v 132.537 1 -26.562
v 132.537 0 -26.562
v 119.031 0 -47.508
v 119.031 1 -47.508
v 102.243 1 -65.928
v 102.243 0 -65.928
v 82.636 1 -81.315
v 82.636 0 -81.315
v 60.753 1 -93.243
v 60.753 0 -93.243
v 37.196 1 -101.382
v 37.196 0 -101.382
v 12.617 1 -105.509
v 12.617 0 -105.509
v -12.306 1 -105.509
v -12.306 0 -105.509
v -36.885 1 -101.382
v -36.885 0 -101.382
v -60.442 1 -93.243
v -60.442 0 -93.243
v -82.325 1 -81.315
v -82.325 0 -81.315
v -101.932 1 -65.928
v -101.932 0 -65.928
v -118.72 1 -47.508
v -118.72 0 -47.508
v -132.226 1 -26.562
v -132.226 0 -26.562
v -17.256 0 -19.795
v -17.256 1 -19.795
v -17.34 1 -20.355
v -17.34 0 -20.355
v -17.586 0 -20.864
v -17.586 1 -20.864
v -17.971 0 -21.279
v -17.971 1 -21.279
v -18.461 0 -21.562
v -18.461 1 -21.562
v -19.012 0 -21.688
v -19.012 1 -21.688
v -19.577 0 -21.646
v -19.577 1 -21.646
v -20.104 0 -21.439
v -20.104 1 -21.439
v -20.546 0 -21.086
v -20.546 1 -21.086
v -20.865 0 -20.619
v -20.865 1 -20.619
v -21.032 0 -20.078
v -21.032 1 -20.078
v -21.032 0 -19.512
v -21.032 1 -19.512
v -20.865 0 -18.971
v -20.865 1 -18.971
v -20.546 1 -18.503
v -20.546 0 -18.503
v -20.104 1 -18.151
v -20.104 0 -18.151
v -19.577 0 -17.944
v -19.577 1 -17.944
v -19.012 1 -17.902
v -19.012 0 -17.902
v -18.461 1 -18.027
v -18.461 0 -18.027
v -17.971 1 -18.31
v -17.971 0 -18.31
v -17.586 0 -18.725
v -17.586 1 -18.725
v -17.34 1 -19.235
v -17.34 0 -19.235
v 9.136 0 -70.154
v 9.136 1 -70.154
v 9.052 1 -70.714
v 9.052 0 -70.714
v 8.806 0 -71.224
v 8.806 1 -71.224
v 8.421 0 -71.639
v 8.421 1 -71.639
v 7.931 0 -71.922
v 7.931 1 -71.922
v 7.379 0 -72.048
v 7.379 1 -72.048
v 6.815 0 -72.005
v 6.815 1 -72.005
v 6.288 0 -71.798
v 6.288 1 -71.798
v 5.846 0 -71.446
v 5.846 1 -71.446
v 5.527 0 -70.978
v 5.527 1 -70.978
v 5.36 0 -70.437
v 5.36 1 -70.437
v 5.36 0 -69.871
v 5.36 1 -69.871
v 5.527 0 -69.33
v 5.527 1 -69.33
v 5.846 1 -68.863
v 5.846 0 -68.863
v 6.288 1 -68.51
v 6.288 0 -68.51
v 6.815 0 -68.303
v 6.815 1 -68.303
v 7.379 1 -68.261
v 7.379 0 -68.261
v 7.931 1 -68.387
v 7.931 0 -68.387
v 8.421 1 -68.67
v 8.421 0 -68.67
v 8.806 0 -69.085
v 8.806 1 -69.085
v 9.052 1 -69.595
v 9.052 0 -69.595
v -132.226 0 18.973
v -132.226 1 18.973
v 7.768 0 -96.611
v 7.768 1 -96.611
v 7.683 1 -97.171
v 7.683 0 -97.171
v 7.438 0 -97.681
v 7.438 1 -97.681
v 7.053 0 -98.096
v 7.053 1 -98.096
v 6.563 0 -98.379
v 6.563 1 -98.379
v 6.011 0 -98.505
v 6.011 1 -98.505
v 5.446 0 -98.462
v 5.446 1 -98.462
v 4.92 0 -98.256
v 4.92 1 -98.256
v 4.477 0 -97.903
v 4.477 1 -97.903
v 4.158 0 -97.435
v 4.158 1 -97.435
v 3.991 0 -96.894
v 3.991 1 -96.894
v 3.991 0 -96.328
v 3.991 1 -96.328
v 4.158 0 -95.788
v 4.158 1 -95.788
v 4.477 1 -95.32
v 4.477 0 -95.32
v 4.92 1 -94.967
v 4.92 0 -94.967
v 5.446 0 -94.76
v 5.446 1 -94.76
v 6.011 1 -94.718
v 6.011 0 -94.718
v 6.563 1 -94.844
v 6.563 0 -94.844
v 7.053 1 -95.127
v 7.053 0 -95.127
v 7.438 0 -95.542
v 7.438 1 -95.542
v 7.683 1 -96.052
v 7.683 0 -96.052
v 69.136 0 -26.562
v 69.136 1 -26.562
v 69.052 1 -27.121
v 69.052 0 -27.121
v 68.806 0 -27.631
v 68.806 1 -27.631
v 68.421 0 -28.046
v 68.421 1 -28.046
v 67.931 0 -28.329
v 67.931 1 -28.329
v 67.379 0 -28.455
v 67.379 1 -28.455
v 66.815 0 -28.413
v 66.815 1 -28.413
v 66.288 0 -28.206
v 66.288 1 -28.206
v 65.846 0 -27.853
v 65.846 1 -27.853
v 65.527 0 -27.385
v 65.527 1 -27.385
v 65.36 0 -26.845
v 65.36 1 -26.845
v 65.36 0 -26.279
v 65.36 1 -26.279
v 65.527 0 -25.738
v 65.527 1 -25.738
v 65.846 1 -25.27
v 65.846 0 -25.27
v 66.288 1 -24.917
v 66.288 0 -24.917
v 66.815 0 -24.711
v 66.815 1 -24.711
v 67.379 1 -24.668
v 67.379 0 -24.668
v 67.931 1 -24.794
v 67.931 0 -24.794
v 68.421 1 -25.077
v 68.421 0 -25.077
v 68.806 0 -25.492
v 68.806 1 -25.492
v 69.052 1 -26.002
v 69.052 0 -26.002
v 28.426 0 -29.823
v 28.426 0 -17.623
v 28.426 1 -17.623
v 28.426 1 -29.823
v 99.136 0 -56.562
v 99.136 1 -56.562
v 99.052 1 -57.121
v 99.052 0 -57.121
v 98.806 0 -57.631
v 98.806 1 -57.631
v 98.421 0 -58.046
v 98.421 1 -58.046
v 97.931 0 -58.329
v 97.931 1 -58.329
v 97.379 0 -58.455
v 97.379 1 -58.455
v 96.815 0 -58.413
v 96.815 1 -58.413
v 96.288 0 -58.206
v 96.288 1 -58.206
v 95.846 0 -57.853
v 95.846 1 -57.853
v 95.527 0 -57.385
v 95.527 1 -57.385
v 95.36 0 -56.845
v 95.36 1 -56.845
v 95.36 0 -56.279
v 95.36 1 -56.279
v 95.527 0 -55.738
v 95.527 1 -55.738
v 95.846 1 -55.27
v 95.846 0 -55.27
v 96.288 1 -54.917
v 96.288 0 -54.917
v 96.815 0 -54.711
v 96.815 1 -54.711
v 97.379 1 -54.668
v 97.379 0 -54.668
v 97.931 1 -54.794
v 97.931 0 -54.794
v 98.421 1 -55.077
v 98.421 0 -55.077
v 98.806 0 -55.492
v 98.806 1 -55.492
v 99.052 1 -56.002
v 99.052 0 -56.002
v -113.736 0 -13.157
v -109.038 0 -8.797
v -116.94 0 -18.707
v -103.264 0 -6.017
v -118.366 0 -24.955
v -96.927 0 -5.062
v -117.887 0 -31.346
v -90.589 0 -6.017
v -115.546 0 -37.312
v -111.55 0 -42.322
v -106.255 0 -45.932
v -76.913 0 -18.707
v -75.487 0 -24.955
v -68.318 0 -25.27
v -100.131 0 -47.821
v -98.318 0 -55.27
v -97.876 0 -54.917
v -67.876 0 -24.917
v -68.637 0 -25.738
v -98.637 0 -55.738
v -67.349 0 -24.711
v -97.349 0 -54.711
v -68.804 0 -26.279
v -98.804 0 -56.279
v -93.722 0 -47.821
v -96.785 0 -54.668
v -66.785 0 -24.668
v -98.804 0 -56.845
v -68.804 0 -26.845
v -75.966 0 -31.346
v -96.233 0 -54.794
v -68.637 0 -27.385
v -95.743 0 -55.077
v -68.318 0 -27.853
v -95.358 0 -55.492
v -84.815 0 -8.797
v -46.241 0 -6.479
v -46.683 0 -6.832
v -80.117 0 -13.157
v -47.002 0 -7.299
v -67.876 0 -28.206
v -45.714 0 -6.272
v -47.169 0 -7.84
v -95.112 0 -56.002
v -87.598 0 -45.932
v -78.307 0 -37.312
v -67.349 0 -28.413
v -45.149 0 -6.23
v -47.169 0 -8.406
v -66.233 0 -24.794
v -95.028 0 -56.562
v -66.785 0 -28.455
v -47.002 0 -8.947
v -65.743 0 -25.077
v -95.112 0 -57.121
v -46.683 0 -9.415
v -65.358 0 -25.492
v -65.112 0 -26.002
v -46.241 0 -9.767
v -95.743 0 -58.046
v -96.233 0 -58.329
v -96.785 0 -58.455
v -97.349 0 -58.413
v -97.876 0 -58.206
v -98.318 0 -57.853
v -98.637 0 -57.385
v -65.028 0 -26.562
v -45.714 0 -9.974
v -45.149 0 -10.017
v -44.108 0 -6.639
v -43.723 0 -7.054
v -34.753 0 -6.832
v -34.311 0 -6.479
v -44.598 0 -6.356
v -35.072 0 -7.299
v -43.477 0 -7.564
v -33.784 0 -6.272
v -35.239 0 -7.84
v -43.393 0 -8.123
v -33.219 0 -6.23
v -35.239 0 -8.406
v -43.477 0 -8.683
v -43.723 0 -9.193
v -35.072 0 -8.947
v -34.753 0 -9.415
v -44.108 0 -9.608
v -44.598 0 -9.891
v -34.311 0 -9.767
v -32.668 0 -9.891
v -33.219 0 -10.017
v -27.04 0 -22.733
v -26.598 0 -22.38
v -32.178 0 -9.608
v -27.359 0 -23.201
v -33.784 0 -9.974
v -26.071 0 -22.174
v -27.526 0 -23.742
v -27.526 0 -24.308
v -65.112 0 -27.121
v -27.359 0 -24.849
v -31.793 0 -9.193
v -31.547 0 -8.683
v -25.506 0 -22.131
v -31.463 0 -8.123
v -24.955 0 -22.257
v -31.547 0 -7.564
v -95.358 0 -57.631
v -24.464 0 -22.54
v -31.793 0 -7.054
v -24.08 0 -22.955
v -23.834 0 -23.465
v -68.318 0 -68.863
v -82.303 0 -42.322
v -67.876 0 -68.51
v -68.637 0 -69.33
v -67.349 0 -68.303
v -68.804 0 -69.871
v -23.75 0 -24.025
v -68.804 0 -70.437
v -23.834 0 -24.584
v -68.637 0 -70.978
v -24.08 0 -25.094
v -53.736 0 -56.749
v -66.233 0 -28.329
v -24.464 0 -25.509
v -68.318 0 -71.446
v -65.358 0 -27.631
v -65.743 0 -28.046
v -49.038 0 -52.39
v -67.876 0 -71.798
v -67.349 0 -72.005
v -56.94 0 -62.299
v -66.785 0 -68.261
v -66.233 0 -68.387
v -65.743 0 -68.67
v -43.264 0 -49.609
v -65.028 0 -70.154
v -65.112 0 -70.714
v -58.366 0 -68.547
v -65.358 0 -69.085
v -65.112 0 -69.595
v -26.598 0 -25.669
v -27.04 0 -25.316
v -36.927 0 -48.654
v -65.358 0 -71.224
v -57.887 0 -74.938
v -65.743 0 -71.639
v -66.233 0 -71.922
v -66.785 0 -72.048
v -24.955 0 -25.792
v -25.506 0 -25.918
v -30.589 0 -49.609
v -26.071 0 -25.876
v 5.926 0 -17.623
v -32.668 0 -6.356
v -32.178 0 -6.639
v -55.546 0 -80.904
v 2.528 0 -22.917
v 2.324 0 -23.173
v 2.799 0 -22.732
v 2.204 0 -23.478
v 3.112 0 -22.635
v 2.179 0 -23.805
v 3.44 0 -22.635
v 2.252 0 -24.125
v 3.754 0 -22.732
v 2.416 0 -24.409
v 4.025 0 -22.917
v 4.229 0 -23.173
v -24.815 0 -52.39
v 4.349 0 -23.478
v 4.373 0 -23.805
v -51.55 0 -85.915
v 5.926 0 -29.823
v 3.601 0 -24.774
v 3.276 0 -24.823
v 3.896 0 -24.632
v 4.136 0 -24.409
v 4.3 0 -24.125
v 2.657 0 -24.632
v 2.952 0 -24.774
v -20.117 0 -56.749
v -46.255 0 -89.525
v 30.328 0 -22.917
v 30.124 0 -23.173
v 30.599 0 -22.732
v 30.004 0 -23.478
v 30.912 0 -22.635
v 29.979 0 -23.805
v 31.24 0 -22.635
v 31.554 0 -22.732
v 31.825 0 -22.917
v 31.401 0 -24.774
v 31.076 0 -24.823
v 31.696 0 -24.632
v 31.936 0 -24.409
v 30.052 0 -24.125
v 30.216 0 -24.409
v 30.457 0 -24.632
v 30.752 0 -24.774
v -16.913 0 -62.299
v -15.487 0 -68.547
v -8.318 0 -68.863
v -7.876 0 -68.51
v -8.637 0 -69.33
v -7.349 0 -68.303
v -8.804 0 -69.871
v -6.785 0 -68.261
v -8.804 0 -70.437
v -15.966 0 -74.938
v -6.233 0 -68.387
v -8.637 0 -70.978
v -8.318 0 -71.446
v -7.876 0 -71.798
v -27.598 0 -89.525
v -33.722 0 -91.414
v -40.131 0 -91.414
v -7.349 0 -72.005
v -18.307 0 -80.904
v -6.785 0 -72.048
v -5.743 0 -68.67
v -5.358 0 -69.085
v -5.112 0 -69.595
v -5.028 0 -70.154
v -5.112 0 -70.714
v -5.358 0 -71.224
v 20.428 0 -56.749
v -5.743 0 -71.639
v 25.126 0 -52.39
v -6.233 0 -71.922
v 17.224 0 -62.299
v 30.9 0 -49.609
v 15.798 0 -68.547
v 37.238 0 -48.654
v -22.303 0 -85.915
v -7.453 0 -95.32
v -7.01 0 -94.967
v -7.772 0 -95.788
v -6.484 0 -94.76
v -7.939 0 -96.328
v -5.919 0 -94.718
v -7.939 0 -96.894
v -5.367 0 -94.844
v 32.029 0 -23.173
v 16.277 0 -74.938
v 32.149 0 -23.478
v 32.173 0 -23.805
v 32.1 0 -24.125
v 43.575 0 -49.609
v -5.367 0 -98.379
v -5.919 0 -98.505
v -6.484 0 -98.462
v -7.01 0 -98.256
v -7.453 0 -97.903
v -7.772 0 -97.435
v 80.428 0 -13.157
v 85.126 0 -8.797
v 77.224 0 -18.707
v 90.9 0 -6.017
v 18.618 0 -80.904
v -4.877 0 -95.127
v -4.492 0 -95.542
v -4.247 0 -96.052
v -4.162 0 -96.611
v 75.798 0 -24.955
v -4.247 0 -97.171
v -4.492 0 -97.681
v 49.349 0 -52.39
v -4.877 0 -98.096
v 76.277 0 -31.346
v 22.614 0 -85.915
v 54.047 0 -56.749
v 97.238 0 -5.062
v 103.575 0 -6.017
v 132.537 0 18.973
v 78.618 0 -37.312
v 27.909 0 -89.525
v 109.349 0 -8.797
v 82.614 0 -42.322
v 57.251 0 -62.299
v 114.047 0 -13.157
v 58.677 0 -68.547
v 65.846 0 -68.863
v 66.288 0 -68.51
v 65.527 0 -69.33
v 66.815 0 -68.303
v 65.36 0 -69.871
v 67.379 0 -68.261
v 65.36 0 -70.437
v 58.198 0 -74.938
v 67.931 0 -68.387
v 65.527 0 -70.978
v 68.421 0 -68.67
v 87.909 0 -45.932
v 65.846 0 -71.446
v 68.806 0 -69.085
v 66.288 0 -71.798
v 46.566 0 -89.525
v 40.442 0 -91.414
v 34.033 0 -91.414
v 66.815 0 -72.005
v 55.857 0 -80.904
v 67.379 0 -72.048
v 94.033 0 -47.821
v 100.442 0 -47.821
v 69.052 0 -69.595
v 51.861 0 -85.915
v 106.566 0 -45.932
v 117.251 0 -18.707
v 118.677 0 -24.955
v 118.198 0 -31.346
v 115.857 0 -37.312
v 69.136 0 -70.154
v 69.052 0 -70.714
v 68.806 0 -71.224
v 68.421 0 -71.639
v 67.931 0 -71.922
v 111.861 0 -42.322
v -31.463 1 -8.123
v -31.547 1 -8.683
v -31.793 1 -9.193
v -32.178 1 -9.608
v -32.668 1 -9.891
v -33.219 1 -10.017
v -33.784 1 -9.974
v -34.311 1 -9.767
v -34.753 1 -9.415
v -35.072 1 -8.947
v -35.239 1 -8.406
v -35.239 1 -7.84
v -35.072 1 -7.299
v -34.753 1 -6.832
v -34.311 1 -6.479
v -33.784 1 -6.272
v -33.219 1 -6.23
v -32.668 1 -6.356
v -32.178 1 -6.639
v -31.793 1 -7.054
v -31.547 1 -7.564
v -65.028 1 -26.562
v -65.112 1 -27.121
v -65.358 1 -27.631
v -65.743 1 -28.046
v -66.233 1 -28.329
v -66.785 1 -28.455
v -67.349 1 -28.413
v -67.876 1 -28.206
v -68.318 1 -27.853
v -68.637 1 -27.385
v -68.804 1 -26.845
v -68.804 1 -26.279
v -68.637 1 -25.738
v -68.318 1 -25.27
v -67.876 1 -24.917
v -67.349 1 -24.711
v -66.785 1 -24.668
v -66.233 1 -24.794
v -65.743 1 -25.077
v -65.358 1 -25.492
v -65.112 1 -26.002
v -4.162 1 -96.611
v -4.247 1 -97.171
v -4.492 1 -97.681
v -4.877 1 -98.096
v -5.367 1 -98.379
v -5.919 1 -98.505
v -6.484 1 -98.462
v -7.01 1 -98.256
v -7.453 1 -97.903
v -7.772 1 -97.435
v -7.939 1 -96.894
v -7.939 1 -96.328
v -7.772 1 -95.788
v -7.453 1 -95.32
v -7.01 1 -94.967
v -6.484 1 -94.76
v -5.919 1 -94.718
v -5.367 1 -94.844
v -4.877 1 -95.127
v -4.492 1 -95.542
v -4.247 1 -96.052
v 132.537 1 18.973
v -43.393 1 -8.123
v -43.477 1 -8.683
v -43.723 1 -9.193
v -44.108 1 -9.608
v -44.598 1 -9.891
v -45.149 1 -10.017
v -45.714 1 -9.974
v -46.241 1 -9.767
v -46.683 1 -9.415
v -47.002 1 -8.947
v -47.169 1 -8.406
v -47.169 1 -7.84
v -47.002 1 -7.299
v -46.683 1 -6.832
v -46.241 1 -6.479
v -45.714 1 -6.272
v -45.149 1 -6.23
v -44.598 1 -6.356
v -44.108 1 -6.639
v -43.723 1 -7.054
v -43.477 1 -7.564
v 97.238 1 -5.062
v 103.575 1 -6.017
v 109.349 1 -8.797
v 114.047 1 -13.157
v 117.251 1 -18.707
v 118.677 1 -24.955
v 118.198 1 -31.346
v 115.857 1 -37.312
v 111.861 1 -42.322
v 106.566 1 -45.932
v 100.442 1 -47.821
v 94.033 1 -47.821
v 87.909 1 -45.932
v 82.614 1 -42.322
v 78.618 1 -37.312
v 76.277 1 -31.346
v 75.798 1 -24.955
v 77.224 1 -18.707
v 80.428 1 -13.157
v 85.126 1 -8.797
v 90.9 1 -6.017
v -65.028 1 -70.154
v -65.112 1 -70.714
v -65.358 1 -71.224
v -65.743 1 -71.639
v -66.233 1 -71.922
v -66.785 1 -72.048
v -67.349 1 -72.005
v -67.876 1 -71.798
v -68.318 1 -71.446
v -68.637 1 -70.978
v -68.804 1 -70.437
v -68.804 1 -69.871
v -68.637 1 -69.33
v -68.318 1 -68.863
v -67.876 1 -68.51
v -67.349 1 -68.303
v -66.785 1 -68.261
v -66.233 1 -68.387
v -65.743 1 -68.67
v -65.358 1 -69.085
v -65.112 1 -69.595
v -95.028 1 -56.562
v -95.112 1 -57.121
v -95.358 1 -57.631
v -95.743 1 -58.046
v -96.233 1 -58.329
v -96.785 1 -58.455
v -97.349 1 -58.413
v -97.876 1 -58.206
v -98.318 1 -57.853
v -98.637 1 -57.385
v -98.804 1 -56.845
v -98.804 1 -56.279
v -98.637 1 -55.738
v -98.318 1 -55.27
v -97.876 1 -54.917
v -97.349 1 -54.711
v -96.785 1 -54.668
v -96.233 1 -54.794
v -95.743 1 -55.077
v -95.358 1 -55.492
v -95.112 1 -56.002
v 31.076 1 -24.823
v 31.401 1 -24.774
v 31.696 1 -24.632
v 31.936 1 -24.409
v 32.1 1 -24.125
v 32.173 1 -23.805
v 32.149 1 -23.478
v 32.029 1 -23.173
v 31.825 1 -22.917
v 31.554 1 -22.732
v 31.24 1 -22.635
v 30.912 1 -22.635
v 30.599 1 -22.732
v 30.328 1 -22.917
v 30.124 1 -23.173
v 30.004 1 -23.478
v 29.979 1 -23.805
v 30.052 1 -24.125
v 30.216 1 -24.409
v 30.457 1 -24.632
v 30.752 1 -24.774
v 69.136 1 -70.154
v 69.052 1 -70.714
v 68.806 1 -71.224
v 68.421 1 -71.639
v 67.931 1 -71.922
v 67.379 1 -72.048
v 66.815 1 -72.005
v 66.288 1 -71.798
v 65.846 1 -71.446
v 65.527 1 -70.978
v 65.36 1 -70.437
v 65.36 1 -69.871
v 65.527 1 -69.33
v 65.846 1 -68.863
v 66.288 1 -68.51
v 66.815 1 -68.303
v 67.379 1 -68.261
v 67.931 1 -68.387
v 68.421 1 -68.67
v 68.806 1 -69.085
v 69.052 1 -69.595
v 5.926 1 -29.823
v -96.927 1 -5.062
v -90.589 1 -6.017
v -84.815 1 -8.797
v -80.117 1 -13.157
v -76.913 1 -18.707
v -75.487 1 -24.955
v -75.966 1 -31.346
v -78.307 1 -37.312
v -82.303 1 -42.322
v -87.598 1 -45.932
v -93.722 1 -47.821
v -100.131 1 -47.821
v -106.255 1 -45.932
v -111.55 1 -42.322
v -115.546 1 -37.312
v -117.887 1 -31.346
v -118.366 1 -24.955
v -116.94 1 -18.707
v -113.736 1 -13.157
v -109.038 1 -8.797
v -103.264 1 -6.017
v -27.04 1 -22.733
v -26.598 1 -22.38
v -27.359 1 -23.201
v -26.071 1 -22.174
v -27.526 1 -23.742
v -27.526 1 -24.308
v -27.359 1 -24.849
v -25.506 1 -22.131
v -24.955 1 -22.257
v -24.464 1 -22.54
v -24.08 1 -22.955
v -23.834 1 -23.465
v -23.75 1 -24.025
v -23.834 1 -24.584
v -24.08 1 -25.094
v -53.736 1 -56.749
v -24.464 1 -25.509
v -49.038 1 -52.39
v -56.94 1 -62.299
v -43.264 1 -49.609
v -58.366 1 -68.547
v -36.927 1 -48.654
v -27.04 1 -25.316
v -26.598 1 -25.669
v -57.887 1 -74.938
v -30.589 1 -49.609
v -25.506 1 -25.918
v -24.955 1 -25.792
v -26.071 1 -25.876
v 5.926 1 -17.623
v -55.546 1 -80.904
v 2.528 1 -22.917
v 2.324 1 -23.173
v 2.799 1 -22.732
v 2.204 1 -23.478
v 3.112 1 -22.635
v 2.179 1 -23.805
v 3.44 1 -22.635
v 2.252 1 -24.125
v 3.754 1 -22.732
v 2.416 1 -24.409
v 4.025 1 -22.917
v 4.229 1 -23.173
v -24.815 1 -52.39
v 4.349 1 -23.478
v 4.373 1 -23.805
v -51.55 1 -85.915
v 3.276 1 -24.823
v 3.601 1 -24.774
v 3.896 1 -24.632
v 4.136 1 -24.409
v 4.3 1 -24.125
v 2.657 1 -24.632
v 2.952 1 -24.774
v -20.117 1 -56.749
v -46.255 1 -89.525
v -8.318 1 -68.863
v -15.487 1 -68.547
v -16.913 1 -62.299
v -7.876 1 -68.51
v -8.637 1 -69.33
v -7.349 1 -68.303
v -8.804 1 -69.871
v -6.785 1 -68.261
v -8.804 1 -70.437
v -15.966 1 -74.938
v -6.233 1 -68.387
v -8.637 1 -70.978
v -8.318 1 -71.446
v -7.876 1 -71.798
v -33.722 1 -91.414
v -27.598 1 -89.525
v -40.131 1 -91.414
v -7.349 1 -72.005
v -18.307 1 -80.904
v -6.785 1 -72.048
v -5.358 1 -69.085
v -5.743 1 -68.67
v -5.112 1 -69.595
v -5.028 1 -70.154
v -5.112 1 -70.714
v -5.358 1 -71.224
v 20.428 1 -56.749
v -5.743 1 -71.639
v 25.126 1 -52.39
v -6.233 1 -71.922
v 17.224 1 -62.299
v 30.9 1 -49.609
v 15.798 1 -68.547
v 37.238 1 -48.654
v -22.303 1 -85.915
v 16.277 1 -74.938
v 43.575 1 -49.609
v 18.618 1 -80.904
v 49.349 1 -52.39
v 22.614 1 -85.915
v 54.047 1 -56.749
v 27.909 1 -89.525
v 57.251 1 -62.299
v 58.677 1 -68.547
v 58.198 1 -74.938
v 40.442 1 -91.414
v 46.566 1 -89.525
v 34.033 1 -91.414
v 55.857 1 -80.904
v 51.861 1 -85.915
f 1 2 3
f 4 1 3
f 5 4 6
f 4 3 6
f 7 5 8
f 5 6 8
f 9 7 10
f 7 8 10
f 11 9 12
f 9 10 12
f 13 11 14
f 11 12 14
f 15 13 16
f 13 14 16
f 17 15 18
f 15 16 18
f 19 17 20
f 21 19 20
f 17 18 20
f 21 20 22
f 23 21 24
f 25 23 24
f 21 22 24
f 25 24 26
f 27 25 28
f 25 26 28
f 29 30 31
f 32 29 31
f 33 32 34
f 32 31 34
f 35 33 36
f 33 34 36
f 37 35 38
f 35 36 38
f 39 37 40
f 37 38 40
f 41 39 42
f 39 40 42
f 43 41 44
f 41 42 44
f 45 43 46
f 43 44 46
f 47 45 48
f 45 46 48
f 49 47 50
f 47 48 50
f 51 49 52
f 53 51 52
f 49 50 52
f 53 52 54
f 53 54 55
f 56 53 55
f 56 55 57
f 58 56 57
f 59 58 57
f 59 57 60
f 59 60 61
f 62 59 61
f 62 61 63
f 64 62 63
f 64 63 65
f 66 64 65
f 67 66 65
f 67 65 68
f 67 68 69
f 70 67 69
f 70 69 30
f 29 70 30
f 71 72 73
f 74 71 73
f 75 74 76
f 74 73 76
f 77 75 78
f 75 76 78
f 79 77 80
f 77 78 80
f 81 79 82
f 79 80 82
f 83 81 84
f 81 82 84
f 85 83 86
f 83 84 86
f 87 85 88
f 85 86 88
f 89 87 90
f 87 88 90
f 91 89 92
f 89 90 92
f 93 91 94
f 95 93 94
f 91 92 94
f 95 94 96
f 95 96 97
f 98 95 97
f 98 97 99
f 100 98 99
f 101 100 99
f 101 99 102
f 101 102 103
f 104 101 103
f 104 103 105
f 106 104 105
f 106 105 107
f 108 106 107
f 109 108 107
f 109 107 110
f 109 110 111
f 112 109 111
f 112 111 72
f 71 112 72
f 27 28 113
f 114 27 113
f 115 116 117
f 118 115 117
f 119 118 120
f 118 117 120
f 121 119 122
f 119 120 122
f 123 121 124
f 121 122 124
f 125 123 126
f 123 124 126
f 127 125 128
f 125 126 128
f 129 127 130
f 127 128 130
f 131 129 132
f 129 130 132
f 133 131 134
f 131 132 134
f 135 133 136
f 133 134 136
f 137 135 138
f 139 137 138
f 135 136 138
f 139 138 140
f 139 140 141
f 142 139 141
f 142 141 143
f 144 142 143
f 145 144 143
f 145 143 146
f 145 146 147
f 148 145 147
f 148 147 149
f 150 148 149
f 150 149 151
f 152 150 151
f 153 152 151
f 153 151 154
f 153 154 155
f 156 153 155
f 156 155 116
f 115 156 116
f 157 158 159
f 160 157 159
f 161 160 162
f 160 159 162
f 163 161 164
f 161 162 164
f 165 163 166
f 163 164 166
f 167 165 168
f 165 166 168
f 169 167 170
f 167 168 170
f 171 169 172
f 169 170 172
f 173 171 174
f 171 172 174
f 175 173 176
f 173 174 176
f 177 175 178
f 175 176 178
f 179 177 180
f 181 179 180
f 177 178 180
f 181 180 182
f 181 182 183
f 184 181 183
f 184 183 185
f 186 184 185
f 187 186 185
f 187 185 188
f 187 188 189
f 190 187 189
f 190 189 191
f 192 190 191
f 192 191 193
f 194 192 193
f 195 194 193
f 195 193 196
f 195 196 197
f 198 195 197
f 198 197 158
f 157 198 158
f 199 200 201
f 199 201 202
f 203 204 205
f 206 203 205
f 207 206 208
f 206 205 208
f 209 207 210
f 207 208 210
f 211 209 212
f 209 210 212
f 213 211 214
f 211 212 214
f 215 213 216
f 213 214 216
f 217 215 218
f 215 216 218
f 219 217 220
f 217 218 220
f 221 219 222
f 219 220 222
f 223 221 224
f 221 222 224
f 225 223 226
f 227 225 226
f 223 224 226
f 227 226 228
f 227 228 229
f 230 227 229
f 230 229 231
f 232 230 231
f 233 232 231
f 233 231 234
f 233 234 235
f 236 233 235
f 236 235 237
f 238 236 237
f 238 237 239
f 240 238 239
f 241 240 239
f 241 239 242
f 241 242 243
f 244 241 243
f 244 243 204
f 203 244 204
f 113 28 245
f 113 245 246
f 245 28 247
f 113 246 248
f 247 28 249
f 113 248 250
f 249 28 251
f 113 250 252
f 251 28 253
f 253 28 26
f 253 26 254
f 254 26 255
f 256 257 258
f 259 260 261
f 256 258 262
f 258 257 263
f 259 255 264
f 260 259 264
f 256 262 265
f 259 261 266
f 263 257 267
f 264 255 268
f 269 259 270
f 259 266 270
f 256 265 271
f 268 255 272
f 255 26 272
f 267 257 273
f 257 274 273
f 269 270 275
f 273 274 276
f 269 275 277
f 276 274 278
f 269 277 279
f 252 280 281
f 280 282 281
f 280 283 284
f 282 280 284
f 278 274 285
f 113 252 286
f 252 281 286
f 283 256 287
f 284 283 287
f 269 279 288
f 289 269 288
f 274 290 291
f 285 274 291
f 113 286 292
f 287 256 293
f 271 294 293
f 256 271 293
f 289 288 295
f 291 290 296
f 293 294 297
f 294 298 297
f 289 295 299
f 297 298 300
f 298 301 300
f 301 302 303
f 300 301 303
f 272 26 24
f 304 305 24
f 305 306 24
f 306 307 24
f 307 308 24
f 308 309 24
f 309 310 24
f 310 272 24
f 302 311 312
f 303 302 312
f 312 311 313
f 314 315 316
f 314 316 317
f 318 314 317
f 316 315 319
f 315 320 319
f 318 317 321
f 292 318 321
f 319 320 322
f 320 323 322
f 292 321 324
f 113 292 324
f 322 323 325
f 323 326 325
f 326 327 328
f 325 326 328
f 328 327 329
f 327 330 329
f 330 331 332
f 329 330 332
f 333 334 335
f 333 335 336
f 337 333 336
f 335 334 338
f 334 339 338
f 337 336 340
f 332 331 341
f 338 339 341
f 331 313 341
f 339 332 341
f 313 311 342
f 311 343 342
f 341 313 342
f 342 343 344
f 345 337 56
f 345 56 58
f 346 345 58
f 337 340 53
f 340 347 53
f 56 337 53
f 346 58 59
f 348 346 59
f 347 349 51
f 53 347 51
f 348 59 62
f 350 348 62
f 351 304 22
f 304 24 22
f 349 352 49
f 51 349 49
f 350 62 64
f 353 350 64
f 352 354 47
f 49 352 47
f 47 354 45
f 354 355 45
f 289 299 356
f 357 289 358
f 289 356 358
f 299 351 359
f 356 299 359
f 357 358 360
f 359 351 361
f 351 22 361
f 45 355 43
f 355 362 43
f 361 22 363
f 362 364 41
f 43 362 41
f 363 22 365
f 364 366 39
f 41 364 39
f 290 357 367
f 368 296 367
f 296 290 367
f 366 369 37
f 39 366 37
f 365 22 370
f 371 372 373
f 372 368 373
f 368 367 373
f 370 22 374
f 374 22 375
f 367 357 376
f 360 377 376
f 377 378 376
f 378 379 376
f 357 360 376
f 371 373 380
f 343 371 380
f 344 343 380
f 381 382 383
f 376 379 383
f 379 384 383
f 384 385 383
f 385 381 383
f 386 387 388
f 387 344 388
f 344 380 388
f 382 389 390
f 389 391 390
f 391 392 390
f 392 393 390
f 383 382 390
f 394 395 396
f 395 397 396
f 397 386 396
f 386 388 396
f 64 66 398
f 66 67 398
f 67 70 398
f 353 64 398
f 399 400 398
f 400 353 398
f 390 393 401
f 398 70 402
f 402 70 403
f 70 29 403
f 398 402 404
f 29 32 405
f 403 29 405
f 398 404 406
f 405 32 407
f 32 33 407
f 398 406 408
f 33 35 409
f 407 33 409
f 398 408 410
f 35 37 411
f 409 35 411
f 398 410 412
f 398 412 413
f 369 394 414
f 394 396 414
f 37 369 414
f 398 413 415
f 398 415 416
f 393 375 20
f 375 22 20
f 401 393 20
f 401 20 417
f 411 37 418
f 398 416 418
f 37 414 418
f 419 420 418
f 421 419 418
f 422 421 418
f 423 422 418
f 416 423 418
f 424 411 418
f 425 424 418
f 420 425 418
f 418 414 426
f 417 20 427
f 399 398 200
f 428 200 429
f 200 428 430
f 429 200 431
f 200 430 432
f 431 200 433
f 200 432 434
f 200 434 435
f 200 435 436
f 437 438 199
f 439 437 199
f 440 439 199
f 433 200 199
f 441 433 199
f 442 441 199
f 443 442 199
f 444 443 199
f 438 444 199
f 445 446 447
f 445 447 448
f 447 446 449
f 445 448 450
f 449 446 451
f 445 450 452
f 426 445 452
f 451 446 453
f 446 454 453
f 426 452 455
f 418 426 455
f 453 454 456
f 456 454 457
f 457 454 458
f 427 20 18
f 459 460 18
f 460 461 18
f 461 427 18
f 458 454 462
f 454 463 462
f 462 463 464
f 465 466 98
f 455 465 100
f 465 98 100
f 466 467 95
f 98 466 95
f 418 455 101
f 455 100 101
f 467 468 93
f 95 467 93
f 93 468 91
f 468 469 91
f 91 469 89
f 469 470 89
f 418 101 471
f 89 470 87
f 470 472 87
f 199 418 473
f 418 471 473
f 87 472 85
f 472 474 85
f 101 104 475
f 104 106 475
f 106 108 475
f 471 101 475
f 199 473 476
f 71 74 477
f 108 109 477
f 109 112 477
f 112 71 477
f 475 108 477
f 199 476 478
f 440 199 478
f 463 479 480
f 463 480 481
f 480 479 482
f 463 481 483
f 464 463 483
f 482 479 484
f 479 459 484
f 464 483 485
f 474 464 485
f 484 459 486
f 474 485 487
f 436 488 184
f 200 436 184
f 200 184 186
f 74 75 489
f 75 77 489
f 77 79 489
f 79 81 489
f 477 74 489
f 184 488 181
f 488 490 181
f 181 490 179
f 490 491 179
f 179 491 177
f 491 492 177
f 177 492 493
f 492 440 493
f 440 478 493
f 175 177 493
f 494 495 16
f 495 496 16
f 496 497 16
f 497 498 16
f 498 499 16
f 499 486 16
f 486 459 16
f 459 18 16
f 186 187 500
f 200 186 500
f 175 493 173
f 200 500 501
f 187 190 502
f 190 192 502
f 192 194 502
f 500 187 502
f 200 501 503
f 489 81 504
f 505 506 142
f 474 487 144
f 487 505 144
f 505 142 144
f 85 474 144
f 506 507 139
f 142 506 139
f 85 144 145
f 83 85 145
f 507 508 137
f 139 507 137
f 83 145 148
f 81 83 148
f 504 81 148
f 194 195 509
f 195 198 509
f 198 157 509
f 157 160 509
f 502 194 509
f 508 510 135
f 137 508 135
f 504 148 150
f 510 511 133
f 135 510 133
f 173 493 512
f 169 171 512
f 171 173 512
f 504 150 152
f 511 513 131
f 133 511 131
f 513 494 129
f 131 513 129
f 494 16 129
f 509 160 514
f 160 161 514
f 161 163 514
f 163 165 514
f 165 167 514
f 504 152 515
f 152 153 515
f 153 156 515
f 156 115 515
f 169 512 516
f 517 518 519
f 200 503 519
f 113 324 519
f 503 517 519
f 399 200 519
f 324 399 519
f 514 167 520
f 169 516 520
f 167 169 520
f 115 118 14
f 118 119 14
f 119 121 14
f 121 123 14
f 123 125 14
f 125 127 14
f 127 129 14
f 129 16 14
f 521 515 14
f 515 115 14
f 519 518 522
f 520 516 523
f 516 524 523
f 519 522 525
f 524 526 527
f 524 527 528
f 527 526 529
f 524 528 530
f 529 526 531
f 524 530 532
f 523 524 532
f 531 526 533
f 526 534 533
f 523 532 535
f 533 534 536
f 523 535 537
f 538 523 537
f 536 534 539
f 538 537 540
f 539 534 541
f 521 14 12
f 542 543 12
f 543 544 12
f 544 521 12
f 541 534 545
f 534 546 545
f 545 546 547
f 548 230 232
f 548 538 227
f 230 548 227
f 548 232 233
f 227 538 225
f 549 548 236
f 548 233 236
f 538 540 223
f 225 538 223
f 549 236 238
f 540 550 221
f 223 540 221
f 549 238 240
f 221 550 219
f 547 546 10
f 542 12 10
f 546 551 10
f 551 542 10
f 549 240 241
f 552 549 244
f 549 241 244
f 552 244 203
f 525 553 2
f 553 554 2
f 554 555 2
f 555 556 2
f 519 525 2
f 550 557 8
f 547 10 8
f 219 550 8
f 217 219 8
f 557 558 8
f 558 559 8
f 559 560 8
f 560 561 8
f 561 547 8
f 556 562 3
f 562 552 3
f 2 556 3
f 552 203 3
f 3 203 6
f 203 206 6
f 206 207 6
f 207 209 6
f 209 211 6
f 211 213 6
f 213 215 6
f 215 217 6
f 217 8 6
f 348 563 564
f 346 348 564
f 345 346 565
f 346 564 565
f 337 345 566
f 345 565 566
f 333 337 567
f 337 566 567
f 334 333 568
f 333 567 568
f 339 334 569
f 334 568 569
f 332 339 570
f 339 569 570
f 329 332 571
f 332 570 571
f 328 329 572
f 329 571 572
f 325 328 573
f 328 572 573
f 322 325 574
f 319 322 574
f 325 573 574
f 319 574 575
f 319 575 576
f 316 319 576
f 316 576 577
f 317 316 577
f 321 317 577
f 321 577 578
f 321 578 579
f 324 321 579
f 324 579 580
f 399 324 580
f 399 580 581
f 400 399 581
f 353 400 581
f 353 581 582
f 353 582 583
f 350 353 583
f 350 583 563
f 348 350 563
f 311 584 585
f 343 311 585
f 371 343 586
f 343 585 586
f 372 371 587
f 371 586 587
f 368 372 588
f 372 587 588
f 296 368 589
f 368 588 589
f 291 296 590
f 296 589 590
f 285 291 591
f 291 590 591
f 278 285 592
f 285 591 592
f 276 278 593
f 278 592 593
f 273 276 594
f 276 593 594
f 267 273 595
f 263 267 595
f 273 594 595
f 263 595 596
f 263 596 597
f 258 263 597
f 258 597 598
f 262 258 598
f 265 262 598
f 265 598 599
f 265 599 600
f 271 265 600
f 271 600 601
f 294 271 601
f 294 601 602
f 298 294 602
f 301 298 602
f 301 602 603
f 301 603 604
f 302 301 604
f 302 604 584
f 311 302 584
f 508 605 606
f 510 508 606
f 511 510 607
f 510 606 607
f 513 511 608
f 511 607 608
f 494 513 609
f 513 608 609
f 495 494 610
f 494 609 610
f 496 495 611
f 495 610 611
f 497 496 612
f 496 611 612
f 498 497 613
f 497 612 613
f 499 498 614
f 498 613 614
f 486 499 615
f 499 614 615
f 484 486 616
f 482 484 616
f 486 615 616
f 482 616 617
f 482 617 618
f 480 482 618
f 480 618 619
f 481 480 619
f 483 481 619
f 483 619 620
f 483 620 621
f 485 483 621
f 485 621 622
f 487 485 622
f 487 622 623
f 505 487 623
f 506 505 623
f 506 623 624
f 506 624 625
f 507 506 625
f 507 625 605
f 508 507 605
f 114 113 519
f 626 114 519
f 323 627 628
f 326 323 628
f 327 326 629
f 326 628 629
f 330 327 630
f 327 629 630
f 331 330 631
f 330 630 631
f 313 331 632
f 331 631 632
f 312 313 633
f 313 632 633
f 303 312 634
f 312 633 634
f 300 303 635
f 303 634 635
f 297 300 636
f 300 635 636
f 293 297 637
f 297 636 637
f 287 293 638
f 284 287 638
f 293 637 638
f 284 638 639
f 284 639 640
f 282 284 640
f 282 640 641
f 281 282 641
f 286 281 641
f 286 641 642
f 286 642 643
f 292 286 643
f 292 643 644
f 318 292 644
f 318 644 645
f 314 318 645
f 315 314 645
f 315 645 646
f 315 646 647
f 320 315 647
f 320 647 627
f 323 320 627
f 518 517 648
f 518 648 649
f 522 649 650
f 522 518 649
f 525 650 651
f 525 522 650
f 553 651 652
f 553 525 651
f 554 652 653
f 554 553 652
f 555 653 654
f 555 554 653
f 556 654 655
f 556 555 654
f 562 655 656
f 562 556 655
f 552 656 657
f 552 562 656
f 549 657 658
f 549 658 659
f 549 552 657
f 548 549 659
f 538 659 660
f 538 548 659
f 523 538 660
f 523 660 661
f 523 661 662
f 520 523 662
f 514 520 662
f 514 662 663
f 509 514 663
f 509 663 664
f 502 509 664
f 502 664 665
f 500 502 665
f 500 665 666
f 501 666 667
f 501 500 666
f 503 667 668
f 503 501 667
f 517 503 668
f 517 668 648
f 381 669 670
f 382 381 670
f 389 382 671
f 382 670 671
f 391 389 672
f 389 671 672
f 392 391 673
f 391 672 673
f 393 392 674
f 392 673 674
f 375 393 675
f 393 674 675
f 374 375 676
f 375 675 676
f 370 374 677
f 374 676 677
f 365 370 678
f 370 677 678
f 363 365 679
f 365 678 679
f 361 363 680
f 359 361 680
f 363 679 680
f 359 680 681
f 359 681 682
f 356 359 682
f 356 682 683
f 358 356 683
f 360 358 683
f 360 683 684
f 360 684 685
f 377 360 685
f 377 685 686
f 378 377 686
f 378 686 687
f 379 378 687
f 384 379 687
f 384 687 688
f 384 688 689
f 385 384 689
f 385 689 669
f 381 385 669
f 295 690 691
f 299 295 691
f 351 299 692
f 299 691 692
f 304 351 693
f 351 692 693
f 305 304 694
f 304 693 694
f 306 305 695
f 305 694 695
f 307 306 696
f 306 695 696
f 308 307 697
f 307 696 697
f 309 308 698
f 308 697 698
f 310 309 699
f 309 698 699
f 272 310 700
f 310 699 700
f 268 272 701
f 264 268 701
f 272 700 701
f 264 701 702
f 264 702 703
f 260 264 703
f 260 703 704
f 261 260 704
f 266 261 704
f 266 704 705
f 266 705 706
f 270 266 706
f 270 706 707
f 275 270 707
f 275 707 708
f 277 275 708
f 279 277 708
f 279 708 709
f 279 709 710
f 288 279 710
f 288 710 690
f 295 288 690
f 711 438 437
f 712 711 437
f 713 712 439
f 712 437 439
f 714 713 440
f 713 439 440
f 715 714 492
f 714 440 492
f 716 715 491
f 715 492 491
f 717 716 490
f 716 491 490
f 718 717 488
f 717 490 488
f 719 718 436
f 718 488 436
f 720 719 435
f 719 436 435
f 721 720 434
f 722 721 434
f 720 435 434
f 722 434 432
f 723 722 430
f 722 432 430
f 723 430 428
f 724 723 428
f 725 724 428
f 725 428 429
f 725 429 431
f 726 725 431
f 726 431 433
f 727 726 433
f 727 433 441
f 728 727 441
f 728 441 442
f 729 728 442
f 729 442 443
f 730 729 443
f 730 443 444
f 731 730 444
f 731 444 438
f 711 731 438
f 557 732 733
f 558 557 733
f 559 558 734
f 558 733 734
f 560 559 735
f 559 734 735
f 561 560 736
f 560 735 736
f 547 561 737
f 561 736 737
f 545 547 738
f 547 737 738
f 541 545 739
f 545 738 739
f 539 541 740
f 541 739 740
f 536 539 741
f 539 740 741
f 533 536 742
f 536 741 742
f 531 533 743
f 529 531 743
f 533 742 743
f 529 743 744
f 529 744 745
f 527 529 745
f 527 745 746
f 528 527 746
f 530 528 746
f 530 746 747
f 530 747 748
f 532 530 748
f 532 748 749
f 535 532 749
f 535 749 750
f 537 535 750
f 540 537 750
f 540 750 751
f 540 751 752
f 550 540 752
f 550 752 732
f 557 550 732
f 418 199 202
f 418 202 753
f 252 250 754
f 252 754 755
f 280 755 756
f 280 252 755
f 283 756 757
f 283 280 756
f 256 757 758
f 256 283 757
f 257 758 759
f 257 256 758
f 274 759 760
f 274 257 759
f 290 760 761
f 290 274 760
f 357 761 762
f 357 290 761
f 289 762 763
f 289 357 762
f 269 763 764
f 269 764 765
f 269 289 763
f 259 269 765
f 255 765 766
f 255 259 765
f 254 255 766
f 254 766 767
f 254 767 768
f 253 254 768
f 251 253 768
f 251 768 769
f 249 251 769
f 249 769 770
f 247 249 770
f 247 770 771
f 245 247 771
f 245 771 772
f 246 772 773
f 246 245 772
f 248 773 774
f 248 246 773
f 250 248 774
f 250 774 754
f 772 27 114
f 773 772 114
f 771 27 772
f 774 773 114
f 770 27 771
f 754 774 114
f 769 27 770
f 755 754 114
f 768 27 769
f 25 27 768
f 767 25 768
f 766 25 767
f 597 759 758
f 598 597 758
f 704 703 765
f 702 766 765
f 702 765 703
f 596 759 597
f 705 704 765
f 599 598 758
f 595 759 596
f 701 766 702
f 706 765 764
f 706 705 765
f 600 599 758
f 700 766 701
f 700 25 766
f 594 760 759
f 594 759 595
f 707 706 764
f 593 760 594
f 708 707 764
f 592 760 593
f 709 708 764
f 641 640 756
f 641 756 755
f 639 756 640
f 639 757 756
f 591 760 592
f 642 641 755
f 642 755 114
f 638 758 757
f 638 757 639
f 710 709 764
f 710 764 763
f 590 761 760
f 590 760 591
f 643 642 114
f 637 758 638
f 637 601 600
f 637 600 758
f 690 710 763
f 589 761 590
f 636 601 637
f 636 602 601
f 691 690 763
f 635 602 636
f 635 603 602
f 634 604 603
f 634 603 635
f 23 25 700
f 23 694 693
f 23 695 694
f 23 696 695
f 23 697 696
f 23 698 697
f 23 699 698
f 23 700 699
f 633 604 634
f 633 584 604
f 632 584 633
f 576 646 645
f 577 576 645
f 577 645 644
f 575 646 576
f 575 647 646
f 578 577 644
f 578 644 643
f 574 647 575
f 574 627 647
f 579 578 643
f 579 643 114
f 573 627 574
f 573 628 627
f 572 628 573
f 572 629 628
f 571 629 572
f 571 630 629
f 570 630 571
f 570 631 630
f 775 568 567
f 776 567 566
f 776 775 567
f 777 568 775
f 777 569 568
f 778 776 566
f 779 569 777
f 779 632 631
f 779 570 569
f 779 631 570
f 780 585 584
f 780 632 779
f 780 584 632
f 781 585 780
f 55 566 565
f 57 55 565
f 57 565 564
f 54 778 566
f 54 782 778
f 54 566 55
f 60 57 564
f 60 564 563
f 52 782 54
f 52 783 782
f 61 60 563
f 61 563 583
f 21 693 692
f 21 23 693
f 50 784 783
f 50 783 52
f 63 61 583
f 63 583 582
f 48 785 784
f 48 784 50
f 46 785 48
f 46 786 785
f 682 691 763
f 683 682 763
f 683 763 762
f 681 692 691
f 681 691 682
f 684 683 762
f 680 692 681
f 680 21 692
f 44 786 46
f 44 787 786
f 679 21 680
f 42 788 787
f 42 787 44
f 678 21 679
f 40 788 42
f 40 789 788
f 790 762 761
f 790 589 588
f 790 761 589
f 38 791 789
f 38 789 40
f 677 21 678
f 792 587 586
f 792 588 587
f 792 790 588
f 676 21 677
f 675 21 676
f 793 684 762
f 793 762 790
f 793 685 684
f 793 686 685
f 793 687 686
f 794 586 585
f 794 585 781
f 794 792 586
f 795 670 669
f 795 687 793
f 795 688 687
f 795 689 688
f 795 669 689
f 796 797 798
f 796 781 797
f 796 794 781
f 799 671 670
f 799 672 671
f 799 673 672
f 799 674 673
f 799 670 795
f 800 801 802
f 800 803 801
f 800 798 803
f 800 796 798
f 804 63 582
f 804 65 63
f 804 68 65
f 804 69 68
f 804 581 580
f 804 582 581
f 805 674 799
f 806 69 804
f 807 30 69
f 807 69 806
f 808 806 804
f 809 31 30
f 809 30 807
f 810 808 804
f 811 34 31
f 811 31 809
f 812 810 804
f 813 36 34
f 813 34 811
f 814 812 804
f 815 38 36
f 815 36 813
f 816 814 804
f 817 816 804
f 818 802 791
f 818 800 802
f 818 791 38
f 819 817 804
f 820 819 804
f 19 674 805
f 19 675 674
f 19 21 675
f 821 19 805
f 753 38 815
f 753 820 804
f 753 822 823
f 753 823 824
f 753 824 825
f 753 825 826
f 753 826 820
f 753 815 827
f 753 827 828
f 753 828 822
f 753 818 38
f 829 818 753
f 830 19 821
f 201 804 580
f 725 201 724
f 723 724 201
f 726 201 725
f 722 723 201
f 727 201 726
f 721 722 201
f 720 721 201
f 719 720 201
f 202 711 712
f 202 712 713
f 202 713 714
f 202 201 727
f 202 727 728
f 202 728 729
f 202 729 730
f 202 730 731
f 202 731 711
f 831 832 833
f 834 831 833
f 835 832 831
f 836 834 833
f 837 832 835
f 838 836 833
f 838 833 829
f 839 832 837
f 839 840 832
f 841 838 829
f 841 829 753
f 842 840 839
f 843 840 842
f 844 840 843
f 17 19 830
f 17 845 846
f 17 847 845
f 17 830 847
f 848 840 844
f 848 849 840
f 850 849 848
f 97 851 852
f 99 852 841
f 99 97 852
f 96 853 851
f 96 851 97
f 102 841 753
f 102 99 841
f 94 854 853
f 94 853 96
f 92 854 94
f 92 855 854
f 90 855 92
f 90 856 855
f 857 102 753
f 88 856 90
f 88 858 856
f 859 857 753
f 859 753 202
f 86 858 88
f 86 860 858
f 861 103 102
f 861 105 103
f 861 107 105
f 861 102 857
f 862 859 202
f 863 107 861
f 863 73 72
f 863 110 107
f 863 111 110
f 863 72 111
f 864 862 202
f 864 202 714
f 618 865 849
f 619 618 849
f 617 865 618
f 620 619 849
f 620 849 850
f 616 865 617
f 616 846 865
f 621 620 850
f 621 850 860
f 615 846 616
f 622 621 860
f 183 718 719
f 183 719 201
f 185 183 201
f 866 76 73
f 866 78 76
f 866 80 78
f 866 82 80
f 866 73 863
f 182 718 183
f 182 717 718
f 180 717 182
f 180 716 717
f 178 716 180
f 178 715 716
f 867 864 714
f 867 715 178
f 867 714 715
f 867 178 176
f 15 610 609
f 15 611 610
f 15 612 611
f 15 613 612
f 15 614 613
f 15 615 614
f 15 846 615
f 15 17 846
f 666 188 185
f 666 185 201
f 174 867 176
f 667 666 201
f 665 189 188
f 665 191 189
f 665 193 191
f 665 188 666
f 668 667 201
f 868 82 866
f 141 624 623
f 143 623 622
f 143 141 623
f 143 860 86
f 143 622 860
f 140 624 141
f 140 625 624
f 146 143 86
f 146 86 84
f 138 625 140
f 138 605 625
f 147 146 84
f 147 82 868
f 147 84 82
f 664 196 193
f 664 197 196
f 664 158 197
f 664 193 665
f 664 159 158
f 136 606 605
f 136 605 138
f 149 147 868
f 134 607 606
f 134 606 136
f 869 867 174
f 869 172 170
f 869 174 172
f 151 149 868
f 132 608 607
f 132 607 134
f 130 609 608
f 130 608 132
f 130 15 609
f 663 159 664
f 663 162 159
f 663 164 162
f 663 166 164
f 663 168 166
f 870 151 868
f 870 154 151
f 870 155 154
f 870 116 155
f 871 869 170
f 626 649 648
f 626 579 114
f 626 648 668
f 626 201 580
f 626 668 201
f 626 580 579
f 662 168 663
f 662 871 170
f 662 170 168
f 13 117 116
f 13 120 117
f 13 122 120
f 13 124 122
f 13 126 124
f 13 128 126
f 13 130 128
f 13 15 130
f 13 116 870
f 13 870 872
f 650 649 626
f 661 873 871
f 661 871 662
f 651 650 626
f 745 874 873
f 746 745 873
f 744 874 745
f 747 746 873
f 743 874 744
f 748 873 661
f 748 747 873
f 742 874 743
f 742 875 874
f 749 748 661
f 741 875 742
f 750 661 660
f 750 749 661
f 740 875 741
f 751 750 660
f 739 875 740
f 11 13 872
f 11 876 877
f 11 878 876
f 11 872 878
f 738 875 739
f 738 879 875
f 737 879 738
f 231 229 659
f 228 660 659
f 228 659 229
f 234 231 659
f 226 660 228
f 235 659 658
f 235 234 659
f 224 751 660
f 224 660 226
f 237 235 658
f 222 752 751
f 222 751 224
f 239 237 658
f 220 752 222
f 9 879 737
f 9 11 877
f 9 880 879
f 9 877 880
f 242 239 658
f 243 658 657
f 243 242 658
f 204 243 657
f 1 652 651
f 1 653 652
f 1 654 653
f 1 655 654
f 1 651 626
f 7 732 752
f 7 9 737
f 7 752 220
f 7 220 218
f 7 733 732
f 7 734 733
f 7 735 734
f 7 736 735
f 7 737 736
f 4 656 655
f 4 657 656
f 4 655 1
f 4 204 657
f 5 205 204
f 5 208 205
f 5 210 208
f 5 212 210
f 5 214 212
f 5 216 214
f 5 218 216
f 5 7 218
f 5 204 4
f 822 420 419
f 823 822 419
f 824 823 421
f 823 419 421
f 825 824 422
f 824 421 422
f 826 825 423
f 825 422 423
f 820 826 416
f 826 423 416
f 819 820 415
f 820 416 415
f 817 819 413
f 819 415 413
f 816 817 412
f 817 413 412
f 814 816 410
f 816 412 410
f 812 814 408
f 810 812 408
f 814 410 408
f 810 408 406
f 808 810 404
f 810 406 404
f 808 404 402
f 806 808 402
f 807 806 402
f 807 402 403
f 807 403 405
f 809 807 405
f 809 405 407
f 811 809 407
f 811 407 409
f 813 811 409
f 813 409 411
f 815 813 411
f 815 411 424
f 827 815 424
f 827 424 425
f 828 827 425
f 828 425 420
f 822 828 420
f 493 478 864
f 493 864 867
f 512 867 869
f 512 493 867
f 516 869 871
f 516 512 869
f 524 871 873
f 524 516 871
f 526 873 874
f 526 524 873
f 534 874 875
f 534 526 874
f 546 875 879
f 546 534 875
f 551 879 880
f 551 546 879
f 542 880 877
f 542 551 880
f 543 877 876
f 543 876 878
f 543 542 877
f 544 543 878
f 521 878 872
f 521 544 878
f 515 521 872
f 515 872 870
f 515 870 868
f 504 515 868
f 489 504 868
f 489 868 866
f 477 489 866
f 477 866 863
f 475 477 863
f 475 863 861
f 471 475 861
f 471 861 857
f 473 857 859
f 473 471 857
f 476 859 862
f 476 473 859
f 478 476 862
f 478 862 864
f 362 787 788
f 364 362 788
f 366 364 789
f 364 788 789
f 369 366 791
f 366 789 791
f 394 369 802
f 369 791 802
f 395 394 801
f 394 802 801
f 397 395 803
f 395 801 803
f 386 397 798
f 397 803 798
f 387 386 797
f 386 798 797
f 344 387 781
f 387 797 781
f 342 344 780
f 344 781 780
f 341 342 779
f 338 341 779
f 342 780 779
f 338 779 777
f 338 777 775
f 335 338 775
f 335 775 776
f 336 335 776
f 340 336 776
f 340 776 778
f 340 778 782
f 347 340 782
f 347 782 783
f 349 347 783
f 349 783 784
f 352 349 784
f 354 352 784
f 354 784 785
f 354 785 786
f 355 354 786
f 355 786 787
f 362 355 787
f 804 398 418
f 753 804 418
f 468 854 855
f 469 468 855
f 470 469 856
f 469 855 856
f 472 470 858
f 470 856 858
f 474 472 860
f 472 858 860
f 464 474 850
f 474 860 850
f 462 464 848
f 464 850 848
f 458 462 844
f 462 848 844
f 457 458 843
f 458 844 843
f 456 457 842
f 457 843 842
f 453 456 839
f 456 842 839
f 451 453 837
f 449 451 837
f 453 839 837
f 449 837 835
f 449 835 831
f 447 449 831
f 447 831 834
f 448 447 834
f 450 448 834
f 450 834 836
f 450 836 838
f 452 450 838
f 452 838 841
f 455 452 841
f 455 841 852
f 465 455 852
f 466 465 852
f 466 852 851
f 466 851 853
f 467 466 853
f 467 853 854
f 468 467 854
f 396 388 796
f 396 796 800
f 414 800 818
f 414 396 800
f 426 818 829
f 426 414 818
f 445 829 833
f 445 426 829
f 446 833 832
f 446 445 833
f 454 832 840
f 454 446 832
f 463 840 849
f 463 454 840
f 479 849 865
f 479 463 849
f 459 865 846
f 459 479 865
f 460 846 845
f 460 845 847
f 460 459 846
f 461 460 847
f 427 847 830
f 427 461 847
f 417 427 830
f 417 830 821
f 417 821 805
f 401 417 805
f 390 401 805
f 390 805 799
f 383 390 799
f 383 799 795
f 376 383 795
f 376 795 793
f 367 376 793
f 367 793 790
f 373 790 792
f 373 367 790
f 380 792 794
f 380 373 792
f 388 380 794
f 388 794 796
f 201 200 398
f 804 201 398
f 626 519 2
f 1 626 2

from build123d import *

# Parameters (mm, degrees)
SKETCH3_R             = 21.5
BOSS_EXTRUDE3_DEPTH   = 1
SKETCH10_R            = 1.1
SKETCH10_W            = 22.5
SKETCH10_H            = 12.2
CUT_EXTRUDE3_DEPTH    = 170.731914631
F_6_CLEARANCE_HOLE1_D = 3.7973


with BuildPart() as part:
    # Sketch3 → Boss-Extrude3 (new body)
    with BuildSketch(Plane(origin=(0, 0, 0), x_dir=(1, 0, 0), z_dir=(0, 1, 0))):
        with BuildLine():
            Line((-132.226234517, -18.972612677), (132.537224892, -18.972612677))
            Line((132.537224892, -18.972612677), (132.537224892, 26.561617598))
            ThreePointArc((132.537224892, 26.561617598), (0.155495187, 106.027387323), (-132.226234517, 26.561617598))
            Line((-132.226234517, 26.561617598), (-132.226234517, -18.972612677))
        make_face()
        with Locations(Location((-96.926544138, 26.561617598, 0), (0, 0, 270))):
            Circle(SKETCH3_R, mode=Mode.SUBTRACT)
        with Locations(Location((97.237534512, 26.561617598, 0), (0, 0, 270))):
            Circle(SKETCH3_R, mode=Mode.SUBTRACT)
        with Locations(Location((-36.926544138, 70.154169278, 0), (0, 0, 270))):
            Circle(SKETCH3_R, mode=Mode.SUBTRACT)
        with Locations(Location((37.237534512, 70.154169278, 0), (0, 0, 270))):
            Circle(SKETCH3_R, mode=Mode.SUBTRACT)
    extrude(amount=BOSS_EXTRUDE3_DEPTH)

    # Sketch10 → Cut-Extrude3 (cut, through all)
    with BuildSketch(Plane(origin=(0, 0, 0), x_dir=(-1, 0, 0), z_dir=(0, -1, 0))):
        with Locations(Location((-31.076423082, 23.72316033, 0), (0, 0, 90))):
            Circle(SKETCH10_R)
        with Locations(Location((-3.276423082, 23.72316033, 0), (0, 0, 90))):
            Circle(SKETCH10_R)
        with Locations((-17.176423082, 23.72316033)):
            Rectangle(SKETCH10_W, SKETCH10_H)
    extrude(amount=-CUT_EXTRUDE3_DEPTH, mode=Mode.SUBTRACT)

    # #6 Clearance Hole1 (through all)
    with Locations(Plane(origin=(0, 0, 0), x_dir=(-1, 0, 0), z_dir=(0, -1, 0))):
        with Locations((-97.237534512, 56.561617598), (-67.237534512, 26.561617598), (-67.237534512, 70.154169278), (-7.237534512, 70.154169278), (6.926544138, 70.154169278), (66.926544138, 70.154169278), (96.926544138, 56.561617598), (66.926544138, 26.561617598), (19.154347381, 19.79486368), (45.291365084, 8.12316033), (33.361365084, 8.12316033), (6.061135322, 96.611330123), (-5.86886721, 96.611330123), (25.648240263, 24.024740184)):
            Hole(F_6_CLEARANCE_HOLE1_D / 2)


solid = part.part
